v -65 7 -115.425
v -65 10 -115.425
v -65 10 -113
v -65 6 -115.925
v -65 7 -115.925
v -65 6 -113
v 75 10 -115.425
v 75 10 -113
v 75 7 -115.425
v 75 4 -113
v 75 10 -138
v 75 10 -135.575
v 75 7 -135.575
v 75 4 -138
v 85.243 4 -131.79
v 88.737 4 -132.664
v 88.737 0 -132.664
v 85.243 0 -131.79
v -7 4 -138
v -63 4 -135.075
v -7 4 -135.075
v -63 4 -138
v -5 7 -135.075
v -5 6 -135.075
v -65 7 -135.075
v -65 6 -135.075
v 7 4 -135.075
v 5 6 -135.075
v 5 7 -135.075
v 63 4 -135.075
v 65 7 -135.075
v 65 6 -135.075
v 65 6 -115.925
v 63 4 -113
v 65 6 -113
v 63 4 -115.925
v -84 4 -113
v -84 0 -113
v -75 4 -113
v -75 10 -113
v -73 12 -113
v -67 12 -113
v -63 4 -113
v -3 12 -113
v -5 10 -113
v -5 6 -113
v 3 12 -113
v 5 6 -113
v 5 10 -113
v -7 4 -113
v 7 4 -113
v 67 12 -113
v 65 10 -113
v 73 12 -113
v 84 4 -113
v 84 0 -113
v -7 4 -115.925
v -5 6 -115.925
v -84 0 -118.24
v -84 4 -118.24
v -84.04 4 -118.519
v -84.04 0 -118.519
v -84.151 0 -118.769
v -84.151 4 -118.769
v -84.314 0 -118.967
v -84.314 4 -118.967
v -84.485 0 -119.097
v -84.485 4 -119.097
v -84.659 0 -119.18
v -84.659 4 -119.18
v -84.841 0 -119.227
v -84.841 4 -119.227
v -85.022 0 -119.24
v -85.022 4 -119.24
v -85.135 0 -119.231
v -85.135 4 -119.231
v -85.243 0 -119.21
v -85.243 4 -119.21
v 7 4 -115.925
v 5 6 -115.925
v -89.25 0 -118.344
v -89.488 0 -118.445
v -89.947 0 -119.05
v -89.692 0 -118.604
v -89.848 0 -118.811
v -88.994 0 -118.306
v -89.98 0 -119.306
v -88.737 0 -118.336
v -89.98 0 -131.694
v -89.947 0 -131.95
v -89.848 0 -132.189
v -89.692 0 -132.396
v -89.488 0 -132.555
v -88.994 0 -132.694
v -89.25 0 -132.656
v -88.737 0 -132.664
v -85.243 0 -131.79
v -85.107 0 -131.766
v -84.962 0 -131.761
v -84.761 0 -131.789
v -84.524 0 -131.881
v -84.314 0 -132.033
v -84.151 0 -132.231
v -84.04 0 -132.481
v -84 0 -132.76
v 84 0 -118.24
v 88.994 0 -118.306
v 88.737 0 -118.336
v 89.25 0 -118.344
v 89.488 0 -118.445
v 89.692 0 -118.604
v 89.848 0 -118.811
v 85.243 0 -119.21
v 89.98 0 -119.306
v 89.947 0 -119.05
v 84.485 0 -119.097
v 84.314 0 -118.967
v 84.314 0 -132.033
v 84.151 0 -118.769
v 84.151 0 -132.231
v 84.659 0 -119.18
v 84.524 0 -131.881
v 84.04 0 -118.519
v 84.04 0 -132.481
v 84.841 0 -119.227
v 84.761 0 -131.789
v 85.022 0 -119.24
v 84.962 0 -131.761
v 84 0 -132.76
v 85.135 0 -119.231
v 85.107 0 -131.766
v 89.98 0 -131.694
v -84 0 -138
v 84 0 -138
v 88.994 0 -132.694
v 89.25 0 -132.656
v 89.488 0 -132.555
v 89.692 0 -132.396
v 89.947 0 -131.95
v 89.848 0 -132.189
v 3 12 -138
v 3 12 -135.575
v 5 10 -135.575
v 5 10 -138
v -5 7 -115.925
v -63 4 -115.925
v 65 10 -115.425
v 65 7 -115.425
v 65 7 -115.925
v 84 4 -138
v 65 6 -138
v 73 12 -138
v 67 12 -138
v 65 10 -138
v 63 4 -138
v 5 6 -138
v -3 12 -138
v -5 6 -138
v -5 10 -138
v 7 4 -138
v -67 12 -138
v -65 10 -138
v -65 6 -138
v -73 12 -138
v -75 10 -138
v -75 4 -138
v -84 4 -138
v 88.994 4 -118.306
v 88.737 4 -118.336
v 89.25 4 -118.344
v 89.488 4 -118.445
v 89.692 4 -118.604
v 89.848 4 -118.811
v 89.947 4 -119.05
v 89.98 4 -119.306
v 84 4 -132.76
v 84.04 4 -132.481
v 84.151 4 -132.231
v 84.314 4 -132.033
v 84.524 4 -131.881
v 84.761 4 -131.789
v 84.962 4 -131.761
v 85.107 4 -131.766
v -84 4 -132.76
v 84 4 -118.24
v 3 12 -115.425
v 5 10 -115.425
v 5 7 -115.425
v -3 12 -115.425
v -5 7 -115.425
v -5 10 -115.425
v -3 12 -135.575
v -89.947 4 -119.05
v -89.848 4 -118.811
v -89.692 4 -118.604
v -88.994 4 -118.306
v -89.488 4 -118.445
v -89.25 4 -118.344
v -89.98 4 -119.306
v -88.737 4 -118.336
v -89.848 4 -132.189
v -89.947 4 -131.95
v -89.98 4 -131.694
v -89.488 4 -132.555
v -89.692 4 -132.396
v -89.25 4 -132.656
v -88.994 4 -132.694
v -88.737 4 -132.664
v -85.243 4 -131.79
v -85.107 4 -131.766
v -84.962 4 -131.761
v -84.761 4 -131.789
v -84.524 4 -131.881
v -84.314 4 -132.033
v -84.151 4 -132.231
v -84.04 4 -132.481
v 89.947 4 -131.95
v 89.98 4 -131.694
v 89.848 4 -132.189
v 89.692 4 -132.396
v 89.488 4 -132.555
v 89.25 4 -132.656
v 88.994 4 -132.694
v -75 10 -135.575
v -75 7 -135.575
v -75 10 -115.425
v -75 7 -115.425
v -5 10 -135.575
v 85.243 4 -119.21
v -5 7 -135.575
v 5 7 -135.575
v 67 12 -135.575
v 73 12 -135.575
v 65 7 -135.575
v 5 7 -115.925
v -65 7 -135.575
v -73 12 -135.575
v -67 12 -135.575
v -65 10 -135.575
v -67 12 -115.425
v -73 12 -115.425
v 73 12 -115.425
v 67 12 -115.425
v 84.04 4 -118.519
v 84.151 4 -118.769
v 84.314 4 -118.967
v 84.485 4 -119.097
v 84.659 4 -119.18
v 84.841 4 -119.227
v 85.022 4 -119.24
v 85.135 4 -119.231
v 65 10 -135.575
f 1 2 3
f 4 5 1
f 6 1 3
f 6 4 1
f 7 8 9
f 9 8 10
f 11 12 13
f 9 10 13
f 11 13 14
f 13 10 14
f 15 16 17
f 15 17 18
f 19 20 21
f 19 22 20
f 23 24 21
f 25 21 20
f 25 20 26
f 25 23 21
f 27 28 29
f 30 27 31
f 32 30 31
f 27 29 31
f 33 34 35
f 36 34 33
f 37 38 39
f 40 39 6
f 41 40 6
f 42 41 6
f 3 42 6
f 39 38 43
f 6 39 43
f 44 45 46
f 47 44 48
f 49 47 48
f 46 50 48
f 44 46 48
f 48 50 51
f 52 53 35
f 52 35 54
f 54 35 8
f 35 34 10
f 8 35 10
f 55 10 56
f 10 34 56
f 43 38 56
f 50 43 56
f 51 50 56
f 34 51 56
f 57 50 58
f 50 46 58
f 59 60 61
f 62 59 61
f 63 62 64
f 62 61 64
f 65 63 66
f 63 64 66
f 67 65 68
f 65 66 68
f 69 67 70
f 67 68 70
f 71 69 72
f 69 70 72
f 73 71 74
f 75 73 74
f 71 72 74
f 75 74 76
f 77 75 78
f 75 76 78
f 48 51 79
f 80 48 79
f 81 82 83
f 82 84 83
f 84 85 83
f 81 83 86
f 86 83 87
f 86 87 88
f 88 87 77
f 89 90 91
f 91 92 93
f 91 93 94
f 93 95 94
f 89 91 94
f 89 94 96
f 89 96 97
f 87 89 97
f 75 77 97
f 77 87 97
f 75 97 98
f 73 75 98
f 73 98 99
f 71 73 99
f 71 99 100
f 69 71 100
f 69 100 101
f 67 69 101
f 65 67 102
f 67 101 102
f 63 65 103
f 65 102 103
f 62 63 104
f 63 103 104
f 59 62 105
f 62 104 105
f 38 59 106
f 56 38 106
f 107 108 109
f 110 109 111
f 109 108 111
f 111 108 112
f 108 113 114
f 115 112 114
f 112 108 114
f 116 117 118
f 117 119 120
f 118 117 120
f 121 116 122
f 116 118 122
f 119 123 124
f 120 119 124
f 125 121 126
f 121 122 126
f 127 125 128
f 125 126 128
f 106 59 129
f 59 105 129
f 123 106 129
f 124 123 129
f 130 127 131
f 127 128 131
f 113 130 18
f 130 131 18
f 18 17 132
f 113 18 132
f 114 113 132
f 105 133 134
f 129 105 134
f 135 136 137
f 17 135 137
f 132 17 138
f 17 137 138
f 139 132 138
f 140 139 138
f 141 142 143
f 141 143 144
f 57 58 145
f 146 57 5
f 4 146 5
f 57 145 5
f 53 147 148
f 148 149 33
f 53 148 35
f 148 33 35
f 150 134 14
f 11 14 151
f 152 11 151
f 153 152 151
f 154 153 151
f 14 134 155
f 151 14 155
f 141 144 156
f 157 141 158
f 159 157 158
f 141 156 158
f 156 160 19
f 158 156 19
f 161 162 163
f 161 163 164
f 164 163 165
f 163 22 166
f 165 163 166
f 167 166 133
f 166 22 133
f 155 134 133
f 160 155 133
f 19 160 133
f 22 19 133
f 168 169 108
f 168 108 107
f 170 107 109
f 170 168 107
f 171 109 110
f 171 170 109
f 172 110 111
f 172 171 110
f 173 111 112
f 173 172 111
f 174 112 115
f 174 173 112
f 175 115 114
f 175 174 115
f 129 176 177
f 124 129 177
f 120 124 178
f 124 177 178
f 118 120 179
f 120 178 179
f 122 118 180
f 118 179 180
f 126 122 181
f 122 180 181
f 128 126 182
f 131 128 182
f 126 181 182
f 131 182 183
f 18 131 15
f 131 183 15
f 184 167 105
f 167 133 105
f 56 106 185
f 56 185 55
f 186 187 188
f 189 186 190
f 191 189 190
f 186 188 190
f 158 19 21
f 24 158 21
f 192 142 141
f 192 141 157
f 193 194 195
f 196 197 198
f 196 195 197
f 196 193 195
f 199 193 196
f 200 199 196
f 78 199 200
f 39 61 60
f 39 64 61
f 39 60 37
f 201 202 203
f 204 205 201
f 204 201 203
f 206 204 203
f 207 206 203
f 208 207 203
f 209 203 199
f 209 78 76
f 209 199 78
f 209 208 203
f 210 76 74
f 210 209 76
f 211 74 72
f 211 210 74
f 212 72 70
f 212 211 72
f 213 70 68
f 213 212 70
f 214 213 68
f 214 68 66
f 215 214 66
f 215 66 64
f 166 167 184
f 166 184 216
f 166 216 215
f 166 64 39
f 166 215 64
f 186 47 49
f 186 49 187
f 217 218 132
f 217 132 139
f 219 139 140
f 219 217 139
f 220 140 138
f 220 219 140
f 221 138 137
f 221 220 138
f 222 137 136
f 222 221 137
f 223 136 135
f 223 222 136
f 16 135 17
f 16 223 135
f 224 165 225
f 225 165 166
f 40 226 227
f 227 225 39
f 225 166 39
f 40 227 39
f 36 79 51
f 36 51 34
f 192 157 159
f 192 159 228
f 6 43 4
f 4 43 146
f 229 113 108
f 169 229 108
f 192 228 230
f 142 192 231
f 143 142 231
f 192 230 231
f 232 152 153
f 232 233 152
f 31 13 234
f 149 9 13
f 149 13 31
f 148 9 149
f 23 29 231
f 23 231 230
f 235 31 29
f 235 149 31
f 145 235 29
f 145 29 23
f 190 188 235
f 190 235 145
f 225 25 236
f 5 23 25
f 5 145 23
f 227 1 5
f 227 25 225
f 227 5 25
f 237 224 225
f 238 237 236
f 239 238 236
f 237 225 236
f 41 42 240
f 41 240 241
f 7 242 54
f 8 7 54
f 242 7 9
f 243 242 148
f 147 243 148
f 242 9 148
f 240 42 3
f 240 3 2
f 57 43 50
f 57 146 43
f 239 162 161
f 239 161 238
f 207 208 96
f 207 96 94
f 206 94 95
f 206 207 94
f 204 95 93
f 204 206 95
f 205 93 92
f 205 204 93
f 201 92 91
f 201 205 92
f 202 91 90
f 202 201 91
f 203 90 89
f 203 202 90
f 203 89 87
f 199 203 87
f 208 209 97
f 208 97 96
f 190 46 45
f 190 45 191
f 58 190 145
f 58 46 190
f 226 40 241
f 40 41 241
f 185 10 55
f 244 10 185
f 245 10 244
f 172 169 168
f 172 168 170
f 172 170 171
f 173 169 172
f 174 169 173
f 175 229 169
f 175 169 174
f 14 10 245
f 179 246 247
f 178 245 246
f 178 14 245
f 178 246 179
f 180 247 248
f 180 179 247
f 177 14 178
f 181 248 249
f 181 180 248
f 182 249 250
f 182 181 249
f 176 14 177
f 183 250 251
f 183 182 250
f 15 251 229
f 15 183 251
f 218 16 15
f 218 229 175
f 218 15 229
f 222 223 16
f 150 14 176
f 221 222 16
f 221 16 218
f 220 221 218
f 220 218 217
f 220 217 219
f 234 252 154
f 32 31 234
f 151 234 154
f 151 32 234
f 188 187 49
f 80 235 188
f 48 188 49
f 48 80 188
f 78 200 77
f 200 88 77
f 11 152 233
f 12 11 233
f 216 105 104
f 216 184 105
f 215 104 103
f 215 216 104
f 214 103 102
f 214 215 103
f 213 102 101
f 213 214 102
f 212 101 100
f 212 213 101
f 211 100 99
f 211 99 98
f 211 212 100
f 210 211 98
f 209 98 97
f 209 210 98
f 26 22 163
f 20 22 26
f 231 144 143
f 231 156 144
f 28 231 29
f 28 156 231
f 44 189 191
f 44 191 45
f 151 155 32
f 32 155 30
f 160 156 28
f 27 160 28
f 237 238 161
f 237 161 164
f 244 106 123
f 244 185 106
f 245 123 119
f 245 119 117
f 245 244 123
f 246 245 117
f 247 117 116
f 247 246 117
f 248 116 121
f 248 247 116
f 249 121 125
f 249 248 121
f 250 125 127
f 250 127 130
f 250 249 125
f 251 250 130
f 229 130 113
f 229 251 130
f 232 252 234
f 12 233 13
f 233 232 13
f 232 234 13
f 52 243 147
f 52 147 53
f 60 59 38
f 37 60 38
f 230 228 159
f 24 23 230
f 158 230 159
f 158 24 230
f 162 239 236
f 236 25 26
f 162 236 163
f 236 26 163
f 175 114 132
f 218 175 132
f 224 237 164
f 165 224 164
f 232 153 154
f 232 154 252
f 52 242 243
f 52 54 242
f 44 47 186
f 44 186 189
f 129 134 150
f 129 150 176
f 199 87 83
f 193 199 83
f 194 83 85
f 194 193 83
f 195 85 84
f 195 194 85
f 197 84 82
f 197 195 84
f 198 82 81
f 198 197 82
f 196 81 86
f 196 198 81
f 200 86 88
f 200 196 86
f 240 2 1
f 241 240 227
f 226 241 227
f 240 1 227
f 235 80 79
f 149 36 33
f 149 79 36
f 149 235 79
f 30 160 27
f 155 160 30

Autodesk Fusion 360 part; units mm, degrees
sketch "Sketch1" plane through (0, 0, 0) normal (0, 1, 0) x (1, 0, 0)
  line L0 (125, 125) -> (-125, 125) construction
  line L1 (-125, 125) -> (-125, -125) construction
  line L2 (-125, -125) -> (125, -125) construction
  line L3 (125, -125) -> (125, 125) construction
  line L4 (125, 125) -> (-125, -125) construction
  line L5 (-125, 125) -> (125, -125) construction
  line L6 (75, 112.1152) -> (-75, 112.1152) construction
  line L7 (-75, 112.1152) -> (-75, 91.9152) construction
  line L8 (-75, 91.9152) -> (75, 91.9152) construction
  line L9 (75, 91.9152) -> (75, 112.1152) construction
  line L10 (75, 112.1152) -> (-75, 91.9152) construction
  line L11 (-75, 112.1152) -> (75, 91.9152) construction
  line L12 (137, 137) -> (92, 137)
  line L13 (92, 137) -> (137, 92)
  line L14 (137, 92) -> (137, 137)
  line L15 (125, 125) -> (137, 137) construction
  line L16 (128, 128) -> (109, 128) construction
  line L17 (109, 128) -> (128, 109) construction
  line L18 (128, 109) -> (128, 128) construction
  line L19 (92, 137) -> (84, 137)
  line L20 (84, 137) -> (84, 114)
  line L21 (84, 114) -> (104, 114)
  line L22 (104, 114) -> (114, 104)
  line L23 (114, 104) -> (114, 84)
  line L24 (114, 84) -> (137, 84)
  line L25 (137, 84) -> (137, 92)
  line L26 (84, 138) -> (-84, 138)
  line L27 (-84, 138) -> (-84, 113)
  line L28 (-84, 113) -> (84, 113)
  line L29 (84, 113) -> (84, 138)
  line L30 (84, 138) -> (-84, 113) construction
  line L31 (-84, 138) -> (84, 113) construction
  point P0 (0, 102.0152)
  point P1 (0, 125.5)
  dimension "d4" = 250
  dimension "d5" = 250
  dimension "d6" = 150
  dimension "d7" = 20.2
  dimension "d8" = 12
  dimension "d9" = 12
  dimension "d10" = 45
  dimension "d11" = 16
  dimension "d12" = 3
  dimension "d13" = 8
  dimension "d14" = 23
  dimension "d15" = 20
  dimension "d16" = 25
  dimension "d17" = 1
ref_plane "WorkPlane1" through (0, 7, 0) normal (0, 1, 0) x (0, 0, 1)
extrude "Extrude1" add sketch "Sketch1" along normal blind 4 contours L20 L26 L27 L28 L29
sketch "Sketch6" plane through (0, 4, 0) normal (0, 1, 0) x (-1, 0, 0)
  line L0 (-84, -113) -> (-84, -138)
  line L1 (-84, -138) -> (84, -138)
  line L2 (84, -138) -> (84, -113)
  line L3 (84, -113) -> (-84, -113)
  line L4 (-75, -135.575) -> (75, -135.575)
  line L5 (75, -135.575) -> (75, -115.425)
  line L6 (75, -115.425) -> (-75, -115.425)
  line L7 (-75, -115.425) -> (-75, -135.575)
  line L8 (-75, -135.575) -> (75, -115.425) construction
  line L9 (75, -135.575) -> (-75, -115.425) construction
  point P0 (0, -125.5)
  point P1 (0, -113)
  point P2 (84, -125.5)
  dimension "d36" = 150
  dimension "d37" = 20.15
extrude "Extrude4" add sketch "Sketch6" along normal up to surface (3 mm away) contours L4 L5 L6 L7
sketch "Sketch7" plane through (0, 4, 0) normal (0, 1, 0) x (-1, 0, 0)
  line L0 (75, -135.575) -> (-75, -135.575)
  line L1 (-75, -135.575) -> (-75, -115.425)
  line L2 (-75, -115.425) -> (75, -115.425)
  line L3 (75, -115.425) -> (75, -135.575)
  line L4 (-84, -113) -> (-84, -138)
  line L5 (-84, -138) -> (84, -138)
  line L6 (84, -138) -> (84, -113)
  line L7 (84, -113) -> (-84, -113)
  line L8 (-5, -135.575) -> (5, -135.575)
  line L9 (5, -135.575) -> (5, -138)
  line L10 (5, -138) -> (-5, -138)
  line L11 (-5, -138) -> (-5, -135.575)
  line L12 (-5, -135.575) -> (5, -138) construction
  line L13 (5, -135.575) -> (-5, -138) construction
  line L14 (-5, -113) -> (5, -113)
  line L15 (5, -113) -> (5, -115.425)
  line L16 (5, -115.425) -> (-5, -115.425)
  line L17 (-5, -115.425) -> (-5, -113)
  line L18 (-5, -113) -> (5, -115.425) construction
  line L19 (5, -113) -> (-5, -115.425) construction
  line L20 (-75, -135.575) -> (-65, -135.575)
  line L21 (-65, -135.575) -> (-65, -138)
  line L22 (-65, -138) -> (-75, -138)
  line L23 (-75, -138) -> (-75, -135.575)
  line L24 (-75, -115.425) -> (-65, -115.425)
  line L25 (-65, -115.425) -> (-65, -113)
  line L26 (-65, -113) -> (-75, -113)
  line L27 (-75, -113) -> (-75, -115.425)
  line L28 (75, -135.575) -> (65, -135.575)
  line L29 (65, -135.575) -> (65, -138)
  line L30 (65, -138) -> (75, -138)
  line L31 (75, -138) -> (75, -135.575)
  line L32 (75, -115.425) -> (65, -115.425)
  line L33 (65, -115.425) -> (65, -113)
  line L34 (65, -113) -> (75, -113)
  line L35 (75, -113) -> (75, -115.425)
  point P0 (0, -136.7875)
  point P1 (0, -114.2125)
  dimension "d42" = 10
extrude "Extrude5" add sketch "Sketch7" along normal blind 8 contours L0 L5 L28 L29 L30 L31 | L2 L7 L32 L33 L34 L35 | L0 L5 L8 L9 L10 L11 | L2 L7 L14 L15 L16 L17 | L0 L5 L20 L21 L22 L23 | L2 L7 L24 L25 L26 L27
chamfer "Chamfer1" distance 2 angle 45 12 edges at (-5, 12, -136.7875) (5, 12, -136.7875) (-5, 12, -114.2125) (5, 12, -114.2125) (-75, 12, -136.7875) (-65, 12, -136.7875) (-75, 12, -114.2125) (-65, 12, -114.2125) (65, 12, -136.7875) (75, 12, -136.7875) (65, 12, -114.2125) (75, 12, -114.2125)
sketch "Sketch9" plane through (0, 0, 0) normal (0, -1, 0) x (1, 0, 0)
  line L0 (84, -138) -> (84, -113)
  line L1 (84, -113) -> (-84, -113)
  line L2 (-84, -113) -> (-84, -138)
  line L3 (-84, -138) -> (84, -138)
  line L4 (84, -119.5) -> (90, -118)
  line L5 (90, -118) -> (90, -133)
  line L6 (90, -133) -> (84, -131.5)
  line L7 (90, -118) -> (84, -131.5) construction
  line L8 (90, -133) -> (84, -119.5) construction
  line L9 (90, -125.5) -> (84, -125.5) construction
  line L10 (84.0049, -119.5194) -> (89.98, -118.0256)
  line L11 (89.98, -118.0256) -> (89.98, -132.9744)
  line L12 (89.98, -132.9744) -> (84.0049, -131.4806)
  line L13 (84.0049, -131.4806) -> (84, -131.4794)
  line L14 (84.0049, -119.5194) -> (84, -119.5206)
  point P0 (90, -125.5)
  dimension "d51" = 12
  dimension "d52" = 15
  dimension "d53" = 6
  dimension "d56" = 0.02
extrude "Extrude7" add sketch "Sketch9" against normal blind 4 contours L0 L10 L11 L12 L13 L14
mirror "Mirror2" about plane through (0, 0, 0) normal (1, 0, 0) of "Extrude7"
fillet "Fillet2" radius 1 8 edges at (-84, 2, -119.5206) (-89.98, 2, -118.0256) (-84, 2, -131.4794) (-89.98, 2, -132.9744) (84, 2, -119.5206) (89.98, 2, -118.0256) (89.98, 2, -132.9744) (84, 2, -131.4794)
sketch "Sketch11" plane through (0, 7, 0) normal (0, 1, 0) x (-1, 0, 0)
  line L0 (-65, -115.425) -> (-75, -115.425)
  line L1 (-75, -115.425) -> (-75, -135.575)
  line L2 (-75, -135.575) -> (-65, -135.575)
  line L3 (-65, -135.575) -> (-5, -135.575)
  line L4 (-5, -135.575) -> (5, -135.575)
  line L5 (5, -135.575) -> (65, -135.575)
  line L6 (65, -135.575) -> (75, -135.575)
  line L7 (75, -135.575) -> (75, -115.425)
  line L8 (75, -115.425) -> (65, -115.425)
  line L9 (65, -115.425) -> (5, -115.425)
  line L10 (5, -115.425) -> (-5, -115.425)
  line L11 (-5, -115.425) -> (-65, -115.425)
  line L12 (65, -135.575) -> (5, -135.575)
  line L13 (5, -135.575) -> (5, -135.075)
  line L14 (5, -135.075) -> (65, -135.075)
  line L15 (65, -135.075) -> (65, -135.575)
  line L16 (65, -115.425) -> (5, -115.425)
  line L17 (5, -115.425) -> (5, -115.925)
  line L18 (5, -115.925) -> (65, -115.925)
  line L19 (65, -115.925) -> (65, -115.425)
  line L20 (-65, -135.575) -> (-5, -135.575)
  line L21 (-5, -135.575) -> (-5, -135.075)
  line L22 (-5, -135.075) -> (-65, -135.075)
  line L23 (-65, -135.075) -> (-65, -135.575)
  line L24 (-65, -115.425) -> (-5, -115.425)
  line L25 (-5, -115.425) -> (-5, -115.925)
  line L26 (-5, -115.925) -> (-65, -115.925)
  line L27 (-65, -115.925) -> (-65, -115.425)
  dimension "d63" = 0.5
extrude "Extrude8" cut sketch "Sketch11" against normal blind 3 contours L11 L24 L25 L26 L27 | L9 L16 L17 L18 L19 | L3 L20 L21 L22 L23 | L5 L12 L13 L14 L15
chamfer "Chamfer2" distance 2 angle 45 8 edges at (5, 4, -114.4625) (-5, 4, -114.4625) (-5, 4, -136.5375) (65, 4, -136.5375) (65, 4, -114.4625) (5, 4, -136.5375) (-65, 4, -114.4625) (-65, 4, -136.5375)
equation "sensor_ref = 7 mm"
